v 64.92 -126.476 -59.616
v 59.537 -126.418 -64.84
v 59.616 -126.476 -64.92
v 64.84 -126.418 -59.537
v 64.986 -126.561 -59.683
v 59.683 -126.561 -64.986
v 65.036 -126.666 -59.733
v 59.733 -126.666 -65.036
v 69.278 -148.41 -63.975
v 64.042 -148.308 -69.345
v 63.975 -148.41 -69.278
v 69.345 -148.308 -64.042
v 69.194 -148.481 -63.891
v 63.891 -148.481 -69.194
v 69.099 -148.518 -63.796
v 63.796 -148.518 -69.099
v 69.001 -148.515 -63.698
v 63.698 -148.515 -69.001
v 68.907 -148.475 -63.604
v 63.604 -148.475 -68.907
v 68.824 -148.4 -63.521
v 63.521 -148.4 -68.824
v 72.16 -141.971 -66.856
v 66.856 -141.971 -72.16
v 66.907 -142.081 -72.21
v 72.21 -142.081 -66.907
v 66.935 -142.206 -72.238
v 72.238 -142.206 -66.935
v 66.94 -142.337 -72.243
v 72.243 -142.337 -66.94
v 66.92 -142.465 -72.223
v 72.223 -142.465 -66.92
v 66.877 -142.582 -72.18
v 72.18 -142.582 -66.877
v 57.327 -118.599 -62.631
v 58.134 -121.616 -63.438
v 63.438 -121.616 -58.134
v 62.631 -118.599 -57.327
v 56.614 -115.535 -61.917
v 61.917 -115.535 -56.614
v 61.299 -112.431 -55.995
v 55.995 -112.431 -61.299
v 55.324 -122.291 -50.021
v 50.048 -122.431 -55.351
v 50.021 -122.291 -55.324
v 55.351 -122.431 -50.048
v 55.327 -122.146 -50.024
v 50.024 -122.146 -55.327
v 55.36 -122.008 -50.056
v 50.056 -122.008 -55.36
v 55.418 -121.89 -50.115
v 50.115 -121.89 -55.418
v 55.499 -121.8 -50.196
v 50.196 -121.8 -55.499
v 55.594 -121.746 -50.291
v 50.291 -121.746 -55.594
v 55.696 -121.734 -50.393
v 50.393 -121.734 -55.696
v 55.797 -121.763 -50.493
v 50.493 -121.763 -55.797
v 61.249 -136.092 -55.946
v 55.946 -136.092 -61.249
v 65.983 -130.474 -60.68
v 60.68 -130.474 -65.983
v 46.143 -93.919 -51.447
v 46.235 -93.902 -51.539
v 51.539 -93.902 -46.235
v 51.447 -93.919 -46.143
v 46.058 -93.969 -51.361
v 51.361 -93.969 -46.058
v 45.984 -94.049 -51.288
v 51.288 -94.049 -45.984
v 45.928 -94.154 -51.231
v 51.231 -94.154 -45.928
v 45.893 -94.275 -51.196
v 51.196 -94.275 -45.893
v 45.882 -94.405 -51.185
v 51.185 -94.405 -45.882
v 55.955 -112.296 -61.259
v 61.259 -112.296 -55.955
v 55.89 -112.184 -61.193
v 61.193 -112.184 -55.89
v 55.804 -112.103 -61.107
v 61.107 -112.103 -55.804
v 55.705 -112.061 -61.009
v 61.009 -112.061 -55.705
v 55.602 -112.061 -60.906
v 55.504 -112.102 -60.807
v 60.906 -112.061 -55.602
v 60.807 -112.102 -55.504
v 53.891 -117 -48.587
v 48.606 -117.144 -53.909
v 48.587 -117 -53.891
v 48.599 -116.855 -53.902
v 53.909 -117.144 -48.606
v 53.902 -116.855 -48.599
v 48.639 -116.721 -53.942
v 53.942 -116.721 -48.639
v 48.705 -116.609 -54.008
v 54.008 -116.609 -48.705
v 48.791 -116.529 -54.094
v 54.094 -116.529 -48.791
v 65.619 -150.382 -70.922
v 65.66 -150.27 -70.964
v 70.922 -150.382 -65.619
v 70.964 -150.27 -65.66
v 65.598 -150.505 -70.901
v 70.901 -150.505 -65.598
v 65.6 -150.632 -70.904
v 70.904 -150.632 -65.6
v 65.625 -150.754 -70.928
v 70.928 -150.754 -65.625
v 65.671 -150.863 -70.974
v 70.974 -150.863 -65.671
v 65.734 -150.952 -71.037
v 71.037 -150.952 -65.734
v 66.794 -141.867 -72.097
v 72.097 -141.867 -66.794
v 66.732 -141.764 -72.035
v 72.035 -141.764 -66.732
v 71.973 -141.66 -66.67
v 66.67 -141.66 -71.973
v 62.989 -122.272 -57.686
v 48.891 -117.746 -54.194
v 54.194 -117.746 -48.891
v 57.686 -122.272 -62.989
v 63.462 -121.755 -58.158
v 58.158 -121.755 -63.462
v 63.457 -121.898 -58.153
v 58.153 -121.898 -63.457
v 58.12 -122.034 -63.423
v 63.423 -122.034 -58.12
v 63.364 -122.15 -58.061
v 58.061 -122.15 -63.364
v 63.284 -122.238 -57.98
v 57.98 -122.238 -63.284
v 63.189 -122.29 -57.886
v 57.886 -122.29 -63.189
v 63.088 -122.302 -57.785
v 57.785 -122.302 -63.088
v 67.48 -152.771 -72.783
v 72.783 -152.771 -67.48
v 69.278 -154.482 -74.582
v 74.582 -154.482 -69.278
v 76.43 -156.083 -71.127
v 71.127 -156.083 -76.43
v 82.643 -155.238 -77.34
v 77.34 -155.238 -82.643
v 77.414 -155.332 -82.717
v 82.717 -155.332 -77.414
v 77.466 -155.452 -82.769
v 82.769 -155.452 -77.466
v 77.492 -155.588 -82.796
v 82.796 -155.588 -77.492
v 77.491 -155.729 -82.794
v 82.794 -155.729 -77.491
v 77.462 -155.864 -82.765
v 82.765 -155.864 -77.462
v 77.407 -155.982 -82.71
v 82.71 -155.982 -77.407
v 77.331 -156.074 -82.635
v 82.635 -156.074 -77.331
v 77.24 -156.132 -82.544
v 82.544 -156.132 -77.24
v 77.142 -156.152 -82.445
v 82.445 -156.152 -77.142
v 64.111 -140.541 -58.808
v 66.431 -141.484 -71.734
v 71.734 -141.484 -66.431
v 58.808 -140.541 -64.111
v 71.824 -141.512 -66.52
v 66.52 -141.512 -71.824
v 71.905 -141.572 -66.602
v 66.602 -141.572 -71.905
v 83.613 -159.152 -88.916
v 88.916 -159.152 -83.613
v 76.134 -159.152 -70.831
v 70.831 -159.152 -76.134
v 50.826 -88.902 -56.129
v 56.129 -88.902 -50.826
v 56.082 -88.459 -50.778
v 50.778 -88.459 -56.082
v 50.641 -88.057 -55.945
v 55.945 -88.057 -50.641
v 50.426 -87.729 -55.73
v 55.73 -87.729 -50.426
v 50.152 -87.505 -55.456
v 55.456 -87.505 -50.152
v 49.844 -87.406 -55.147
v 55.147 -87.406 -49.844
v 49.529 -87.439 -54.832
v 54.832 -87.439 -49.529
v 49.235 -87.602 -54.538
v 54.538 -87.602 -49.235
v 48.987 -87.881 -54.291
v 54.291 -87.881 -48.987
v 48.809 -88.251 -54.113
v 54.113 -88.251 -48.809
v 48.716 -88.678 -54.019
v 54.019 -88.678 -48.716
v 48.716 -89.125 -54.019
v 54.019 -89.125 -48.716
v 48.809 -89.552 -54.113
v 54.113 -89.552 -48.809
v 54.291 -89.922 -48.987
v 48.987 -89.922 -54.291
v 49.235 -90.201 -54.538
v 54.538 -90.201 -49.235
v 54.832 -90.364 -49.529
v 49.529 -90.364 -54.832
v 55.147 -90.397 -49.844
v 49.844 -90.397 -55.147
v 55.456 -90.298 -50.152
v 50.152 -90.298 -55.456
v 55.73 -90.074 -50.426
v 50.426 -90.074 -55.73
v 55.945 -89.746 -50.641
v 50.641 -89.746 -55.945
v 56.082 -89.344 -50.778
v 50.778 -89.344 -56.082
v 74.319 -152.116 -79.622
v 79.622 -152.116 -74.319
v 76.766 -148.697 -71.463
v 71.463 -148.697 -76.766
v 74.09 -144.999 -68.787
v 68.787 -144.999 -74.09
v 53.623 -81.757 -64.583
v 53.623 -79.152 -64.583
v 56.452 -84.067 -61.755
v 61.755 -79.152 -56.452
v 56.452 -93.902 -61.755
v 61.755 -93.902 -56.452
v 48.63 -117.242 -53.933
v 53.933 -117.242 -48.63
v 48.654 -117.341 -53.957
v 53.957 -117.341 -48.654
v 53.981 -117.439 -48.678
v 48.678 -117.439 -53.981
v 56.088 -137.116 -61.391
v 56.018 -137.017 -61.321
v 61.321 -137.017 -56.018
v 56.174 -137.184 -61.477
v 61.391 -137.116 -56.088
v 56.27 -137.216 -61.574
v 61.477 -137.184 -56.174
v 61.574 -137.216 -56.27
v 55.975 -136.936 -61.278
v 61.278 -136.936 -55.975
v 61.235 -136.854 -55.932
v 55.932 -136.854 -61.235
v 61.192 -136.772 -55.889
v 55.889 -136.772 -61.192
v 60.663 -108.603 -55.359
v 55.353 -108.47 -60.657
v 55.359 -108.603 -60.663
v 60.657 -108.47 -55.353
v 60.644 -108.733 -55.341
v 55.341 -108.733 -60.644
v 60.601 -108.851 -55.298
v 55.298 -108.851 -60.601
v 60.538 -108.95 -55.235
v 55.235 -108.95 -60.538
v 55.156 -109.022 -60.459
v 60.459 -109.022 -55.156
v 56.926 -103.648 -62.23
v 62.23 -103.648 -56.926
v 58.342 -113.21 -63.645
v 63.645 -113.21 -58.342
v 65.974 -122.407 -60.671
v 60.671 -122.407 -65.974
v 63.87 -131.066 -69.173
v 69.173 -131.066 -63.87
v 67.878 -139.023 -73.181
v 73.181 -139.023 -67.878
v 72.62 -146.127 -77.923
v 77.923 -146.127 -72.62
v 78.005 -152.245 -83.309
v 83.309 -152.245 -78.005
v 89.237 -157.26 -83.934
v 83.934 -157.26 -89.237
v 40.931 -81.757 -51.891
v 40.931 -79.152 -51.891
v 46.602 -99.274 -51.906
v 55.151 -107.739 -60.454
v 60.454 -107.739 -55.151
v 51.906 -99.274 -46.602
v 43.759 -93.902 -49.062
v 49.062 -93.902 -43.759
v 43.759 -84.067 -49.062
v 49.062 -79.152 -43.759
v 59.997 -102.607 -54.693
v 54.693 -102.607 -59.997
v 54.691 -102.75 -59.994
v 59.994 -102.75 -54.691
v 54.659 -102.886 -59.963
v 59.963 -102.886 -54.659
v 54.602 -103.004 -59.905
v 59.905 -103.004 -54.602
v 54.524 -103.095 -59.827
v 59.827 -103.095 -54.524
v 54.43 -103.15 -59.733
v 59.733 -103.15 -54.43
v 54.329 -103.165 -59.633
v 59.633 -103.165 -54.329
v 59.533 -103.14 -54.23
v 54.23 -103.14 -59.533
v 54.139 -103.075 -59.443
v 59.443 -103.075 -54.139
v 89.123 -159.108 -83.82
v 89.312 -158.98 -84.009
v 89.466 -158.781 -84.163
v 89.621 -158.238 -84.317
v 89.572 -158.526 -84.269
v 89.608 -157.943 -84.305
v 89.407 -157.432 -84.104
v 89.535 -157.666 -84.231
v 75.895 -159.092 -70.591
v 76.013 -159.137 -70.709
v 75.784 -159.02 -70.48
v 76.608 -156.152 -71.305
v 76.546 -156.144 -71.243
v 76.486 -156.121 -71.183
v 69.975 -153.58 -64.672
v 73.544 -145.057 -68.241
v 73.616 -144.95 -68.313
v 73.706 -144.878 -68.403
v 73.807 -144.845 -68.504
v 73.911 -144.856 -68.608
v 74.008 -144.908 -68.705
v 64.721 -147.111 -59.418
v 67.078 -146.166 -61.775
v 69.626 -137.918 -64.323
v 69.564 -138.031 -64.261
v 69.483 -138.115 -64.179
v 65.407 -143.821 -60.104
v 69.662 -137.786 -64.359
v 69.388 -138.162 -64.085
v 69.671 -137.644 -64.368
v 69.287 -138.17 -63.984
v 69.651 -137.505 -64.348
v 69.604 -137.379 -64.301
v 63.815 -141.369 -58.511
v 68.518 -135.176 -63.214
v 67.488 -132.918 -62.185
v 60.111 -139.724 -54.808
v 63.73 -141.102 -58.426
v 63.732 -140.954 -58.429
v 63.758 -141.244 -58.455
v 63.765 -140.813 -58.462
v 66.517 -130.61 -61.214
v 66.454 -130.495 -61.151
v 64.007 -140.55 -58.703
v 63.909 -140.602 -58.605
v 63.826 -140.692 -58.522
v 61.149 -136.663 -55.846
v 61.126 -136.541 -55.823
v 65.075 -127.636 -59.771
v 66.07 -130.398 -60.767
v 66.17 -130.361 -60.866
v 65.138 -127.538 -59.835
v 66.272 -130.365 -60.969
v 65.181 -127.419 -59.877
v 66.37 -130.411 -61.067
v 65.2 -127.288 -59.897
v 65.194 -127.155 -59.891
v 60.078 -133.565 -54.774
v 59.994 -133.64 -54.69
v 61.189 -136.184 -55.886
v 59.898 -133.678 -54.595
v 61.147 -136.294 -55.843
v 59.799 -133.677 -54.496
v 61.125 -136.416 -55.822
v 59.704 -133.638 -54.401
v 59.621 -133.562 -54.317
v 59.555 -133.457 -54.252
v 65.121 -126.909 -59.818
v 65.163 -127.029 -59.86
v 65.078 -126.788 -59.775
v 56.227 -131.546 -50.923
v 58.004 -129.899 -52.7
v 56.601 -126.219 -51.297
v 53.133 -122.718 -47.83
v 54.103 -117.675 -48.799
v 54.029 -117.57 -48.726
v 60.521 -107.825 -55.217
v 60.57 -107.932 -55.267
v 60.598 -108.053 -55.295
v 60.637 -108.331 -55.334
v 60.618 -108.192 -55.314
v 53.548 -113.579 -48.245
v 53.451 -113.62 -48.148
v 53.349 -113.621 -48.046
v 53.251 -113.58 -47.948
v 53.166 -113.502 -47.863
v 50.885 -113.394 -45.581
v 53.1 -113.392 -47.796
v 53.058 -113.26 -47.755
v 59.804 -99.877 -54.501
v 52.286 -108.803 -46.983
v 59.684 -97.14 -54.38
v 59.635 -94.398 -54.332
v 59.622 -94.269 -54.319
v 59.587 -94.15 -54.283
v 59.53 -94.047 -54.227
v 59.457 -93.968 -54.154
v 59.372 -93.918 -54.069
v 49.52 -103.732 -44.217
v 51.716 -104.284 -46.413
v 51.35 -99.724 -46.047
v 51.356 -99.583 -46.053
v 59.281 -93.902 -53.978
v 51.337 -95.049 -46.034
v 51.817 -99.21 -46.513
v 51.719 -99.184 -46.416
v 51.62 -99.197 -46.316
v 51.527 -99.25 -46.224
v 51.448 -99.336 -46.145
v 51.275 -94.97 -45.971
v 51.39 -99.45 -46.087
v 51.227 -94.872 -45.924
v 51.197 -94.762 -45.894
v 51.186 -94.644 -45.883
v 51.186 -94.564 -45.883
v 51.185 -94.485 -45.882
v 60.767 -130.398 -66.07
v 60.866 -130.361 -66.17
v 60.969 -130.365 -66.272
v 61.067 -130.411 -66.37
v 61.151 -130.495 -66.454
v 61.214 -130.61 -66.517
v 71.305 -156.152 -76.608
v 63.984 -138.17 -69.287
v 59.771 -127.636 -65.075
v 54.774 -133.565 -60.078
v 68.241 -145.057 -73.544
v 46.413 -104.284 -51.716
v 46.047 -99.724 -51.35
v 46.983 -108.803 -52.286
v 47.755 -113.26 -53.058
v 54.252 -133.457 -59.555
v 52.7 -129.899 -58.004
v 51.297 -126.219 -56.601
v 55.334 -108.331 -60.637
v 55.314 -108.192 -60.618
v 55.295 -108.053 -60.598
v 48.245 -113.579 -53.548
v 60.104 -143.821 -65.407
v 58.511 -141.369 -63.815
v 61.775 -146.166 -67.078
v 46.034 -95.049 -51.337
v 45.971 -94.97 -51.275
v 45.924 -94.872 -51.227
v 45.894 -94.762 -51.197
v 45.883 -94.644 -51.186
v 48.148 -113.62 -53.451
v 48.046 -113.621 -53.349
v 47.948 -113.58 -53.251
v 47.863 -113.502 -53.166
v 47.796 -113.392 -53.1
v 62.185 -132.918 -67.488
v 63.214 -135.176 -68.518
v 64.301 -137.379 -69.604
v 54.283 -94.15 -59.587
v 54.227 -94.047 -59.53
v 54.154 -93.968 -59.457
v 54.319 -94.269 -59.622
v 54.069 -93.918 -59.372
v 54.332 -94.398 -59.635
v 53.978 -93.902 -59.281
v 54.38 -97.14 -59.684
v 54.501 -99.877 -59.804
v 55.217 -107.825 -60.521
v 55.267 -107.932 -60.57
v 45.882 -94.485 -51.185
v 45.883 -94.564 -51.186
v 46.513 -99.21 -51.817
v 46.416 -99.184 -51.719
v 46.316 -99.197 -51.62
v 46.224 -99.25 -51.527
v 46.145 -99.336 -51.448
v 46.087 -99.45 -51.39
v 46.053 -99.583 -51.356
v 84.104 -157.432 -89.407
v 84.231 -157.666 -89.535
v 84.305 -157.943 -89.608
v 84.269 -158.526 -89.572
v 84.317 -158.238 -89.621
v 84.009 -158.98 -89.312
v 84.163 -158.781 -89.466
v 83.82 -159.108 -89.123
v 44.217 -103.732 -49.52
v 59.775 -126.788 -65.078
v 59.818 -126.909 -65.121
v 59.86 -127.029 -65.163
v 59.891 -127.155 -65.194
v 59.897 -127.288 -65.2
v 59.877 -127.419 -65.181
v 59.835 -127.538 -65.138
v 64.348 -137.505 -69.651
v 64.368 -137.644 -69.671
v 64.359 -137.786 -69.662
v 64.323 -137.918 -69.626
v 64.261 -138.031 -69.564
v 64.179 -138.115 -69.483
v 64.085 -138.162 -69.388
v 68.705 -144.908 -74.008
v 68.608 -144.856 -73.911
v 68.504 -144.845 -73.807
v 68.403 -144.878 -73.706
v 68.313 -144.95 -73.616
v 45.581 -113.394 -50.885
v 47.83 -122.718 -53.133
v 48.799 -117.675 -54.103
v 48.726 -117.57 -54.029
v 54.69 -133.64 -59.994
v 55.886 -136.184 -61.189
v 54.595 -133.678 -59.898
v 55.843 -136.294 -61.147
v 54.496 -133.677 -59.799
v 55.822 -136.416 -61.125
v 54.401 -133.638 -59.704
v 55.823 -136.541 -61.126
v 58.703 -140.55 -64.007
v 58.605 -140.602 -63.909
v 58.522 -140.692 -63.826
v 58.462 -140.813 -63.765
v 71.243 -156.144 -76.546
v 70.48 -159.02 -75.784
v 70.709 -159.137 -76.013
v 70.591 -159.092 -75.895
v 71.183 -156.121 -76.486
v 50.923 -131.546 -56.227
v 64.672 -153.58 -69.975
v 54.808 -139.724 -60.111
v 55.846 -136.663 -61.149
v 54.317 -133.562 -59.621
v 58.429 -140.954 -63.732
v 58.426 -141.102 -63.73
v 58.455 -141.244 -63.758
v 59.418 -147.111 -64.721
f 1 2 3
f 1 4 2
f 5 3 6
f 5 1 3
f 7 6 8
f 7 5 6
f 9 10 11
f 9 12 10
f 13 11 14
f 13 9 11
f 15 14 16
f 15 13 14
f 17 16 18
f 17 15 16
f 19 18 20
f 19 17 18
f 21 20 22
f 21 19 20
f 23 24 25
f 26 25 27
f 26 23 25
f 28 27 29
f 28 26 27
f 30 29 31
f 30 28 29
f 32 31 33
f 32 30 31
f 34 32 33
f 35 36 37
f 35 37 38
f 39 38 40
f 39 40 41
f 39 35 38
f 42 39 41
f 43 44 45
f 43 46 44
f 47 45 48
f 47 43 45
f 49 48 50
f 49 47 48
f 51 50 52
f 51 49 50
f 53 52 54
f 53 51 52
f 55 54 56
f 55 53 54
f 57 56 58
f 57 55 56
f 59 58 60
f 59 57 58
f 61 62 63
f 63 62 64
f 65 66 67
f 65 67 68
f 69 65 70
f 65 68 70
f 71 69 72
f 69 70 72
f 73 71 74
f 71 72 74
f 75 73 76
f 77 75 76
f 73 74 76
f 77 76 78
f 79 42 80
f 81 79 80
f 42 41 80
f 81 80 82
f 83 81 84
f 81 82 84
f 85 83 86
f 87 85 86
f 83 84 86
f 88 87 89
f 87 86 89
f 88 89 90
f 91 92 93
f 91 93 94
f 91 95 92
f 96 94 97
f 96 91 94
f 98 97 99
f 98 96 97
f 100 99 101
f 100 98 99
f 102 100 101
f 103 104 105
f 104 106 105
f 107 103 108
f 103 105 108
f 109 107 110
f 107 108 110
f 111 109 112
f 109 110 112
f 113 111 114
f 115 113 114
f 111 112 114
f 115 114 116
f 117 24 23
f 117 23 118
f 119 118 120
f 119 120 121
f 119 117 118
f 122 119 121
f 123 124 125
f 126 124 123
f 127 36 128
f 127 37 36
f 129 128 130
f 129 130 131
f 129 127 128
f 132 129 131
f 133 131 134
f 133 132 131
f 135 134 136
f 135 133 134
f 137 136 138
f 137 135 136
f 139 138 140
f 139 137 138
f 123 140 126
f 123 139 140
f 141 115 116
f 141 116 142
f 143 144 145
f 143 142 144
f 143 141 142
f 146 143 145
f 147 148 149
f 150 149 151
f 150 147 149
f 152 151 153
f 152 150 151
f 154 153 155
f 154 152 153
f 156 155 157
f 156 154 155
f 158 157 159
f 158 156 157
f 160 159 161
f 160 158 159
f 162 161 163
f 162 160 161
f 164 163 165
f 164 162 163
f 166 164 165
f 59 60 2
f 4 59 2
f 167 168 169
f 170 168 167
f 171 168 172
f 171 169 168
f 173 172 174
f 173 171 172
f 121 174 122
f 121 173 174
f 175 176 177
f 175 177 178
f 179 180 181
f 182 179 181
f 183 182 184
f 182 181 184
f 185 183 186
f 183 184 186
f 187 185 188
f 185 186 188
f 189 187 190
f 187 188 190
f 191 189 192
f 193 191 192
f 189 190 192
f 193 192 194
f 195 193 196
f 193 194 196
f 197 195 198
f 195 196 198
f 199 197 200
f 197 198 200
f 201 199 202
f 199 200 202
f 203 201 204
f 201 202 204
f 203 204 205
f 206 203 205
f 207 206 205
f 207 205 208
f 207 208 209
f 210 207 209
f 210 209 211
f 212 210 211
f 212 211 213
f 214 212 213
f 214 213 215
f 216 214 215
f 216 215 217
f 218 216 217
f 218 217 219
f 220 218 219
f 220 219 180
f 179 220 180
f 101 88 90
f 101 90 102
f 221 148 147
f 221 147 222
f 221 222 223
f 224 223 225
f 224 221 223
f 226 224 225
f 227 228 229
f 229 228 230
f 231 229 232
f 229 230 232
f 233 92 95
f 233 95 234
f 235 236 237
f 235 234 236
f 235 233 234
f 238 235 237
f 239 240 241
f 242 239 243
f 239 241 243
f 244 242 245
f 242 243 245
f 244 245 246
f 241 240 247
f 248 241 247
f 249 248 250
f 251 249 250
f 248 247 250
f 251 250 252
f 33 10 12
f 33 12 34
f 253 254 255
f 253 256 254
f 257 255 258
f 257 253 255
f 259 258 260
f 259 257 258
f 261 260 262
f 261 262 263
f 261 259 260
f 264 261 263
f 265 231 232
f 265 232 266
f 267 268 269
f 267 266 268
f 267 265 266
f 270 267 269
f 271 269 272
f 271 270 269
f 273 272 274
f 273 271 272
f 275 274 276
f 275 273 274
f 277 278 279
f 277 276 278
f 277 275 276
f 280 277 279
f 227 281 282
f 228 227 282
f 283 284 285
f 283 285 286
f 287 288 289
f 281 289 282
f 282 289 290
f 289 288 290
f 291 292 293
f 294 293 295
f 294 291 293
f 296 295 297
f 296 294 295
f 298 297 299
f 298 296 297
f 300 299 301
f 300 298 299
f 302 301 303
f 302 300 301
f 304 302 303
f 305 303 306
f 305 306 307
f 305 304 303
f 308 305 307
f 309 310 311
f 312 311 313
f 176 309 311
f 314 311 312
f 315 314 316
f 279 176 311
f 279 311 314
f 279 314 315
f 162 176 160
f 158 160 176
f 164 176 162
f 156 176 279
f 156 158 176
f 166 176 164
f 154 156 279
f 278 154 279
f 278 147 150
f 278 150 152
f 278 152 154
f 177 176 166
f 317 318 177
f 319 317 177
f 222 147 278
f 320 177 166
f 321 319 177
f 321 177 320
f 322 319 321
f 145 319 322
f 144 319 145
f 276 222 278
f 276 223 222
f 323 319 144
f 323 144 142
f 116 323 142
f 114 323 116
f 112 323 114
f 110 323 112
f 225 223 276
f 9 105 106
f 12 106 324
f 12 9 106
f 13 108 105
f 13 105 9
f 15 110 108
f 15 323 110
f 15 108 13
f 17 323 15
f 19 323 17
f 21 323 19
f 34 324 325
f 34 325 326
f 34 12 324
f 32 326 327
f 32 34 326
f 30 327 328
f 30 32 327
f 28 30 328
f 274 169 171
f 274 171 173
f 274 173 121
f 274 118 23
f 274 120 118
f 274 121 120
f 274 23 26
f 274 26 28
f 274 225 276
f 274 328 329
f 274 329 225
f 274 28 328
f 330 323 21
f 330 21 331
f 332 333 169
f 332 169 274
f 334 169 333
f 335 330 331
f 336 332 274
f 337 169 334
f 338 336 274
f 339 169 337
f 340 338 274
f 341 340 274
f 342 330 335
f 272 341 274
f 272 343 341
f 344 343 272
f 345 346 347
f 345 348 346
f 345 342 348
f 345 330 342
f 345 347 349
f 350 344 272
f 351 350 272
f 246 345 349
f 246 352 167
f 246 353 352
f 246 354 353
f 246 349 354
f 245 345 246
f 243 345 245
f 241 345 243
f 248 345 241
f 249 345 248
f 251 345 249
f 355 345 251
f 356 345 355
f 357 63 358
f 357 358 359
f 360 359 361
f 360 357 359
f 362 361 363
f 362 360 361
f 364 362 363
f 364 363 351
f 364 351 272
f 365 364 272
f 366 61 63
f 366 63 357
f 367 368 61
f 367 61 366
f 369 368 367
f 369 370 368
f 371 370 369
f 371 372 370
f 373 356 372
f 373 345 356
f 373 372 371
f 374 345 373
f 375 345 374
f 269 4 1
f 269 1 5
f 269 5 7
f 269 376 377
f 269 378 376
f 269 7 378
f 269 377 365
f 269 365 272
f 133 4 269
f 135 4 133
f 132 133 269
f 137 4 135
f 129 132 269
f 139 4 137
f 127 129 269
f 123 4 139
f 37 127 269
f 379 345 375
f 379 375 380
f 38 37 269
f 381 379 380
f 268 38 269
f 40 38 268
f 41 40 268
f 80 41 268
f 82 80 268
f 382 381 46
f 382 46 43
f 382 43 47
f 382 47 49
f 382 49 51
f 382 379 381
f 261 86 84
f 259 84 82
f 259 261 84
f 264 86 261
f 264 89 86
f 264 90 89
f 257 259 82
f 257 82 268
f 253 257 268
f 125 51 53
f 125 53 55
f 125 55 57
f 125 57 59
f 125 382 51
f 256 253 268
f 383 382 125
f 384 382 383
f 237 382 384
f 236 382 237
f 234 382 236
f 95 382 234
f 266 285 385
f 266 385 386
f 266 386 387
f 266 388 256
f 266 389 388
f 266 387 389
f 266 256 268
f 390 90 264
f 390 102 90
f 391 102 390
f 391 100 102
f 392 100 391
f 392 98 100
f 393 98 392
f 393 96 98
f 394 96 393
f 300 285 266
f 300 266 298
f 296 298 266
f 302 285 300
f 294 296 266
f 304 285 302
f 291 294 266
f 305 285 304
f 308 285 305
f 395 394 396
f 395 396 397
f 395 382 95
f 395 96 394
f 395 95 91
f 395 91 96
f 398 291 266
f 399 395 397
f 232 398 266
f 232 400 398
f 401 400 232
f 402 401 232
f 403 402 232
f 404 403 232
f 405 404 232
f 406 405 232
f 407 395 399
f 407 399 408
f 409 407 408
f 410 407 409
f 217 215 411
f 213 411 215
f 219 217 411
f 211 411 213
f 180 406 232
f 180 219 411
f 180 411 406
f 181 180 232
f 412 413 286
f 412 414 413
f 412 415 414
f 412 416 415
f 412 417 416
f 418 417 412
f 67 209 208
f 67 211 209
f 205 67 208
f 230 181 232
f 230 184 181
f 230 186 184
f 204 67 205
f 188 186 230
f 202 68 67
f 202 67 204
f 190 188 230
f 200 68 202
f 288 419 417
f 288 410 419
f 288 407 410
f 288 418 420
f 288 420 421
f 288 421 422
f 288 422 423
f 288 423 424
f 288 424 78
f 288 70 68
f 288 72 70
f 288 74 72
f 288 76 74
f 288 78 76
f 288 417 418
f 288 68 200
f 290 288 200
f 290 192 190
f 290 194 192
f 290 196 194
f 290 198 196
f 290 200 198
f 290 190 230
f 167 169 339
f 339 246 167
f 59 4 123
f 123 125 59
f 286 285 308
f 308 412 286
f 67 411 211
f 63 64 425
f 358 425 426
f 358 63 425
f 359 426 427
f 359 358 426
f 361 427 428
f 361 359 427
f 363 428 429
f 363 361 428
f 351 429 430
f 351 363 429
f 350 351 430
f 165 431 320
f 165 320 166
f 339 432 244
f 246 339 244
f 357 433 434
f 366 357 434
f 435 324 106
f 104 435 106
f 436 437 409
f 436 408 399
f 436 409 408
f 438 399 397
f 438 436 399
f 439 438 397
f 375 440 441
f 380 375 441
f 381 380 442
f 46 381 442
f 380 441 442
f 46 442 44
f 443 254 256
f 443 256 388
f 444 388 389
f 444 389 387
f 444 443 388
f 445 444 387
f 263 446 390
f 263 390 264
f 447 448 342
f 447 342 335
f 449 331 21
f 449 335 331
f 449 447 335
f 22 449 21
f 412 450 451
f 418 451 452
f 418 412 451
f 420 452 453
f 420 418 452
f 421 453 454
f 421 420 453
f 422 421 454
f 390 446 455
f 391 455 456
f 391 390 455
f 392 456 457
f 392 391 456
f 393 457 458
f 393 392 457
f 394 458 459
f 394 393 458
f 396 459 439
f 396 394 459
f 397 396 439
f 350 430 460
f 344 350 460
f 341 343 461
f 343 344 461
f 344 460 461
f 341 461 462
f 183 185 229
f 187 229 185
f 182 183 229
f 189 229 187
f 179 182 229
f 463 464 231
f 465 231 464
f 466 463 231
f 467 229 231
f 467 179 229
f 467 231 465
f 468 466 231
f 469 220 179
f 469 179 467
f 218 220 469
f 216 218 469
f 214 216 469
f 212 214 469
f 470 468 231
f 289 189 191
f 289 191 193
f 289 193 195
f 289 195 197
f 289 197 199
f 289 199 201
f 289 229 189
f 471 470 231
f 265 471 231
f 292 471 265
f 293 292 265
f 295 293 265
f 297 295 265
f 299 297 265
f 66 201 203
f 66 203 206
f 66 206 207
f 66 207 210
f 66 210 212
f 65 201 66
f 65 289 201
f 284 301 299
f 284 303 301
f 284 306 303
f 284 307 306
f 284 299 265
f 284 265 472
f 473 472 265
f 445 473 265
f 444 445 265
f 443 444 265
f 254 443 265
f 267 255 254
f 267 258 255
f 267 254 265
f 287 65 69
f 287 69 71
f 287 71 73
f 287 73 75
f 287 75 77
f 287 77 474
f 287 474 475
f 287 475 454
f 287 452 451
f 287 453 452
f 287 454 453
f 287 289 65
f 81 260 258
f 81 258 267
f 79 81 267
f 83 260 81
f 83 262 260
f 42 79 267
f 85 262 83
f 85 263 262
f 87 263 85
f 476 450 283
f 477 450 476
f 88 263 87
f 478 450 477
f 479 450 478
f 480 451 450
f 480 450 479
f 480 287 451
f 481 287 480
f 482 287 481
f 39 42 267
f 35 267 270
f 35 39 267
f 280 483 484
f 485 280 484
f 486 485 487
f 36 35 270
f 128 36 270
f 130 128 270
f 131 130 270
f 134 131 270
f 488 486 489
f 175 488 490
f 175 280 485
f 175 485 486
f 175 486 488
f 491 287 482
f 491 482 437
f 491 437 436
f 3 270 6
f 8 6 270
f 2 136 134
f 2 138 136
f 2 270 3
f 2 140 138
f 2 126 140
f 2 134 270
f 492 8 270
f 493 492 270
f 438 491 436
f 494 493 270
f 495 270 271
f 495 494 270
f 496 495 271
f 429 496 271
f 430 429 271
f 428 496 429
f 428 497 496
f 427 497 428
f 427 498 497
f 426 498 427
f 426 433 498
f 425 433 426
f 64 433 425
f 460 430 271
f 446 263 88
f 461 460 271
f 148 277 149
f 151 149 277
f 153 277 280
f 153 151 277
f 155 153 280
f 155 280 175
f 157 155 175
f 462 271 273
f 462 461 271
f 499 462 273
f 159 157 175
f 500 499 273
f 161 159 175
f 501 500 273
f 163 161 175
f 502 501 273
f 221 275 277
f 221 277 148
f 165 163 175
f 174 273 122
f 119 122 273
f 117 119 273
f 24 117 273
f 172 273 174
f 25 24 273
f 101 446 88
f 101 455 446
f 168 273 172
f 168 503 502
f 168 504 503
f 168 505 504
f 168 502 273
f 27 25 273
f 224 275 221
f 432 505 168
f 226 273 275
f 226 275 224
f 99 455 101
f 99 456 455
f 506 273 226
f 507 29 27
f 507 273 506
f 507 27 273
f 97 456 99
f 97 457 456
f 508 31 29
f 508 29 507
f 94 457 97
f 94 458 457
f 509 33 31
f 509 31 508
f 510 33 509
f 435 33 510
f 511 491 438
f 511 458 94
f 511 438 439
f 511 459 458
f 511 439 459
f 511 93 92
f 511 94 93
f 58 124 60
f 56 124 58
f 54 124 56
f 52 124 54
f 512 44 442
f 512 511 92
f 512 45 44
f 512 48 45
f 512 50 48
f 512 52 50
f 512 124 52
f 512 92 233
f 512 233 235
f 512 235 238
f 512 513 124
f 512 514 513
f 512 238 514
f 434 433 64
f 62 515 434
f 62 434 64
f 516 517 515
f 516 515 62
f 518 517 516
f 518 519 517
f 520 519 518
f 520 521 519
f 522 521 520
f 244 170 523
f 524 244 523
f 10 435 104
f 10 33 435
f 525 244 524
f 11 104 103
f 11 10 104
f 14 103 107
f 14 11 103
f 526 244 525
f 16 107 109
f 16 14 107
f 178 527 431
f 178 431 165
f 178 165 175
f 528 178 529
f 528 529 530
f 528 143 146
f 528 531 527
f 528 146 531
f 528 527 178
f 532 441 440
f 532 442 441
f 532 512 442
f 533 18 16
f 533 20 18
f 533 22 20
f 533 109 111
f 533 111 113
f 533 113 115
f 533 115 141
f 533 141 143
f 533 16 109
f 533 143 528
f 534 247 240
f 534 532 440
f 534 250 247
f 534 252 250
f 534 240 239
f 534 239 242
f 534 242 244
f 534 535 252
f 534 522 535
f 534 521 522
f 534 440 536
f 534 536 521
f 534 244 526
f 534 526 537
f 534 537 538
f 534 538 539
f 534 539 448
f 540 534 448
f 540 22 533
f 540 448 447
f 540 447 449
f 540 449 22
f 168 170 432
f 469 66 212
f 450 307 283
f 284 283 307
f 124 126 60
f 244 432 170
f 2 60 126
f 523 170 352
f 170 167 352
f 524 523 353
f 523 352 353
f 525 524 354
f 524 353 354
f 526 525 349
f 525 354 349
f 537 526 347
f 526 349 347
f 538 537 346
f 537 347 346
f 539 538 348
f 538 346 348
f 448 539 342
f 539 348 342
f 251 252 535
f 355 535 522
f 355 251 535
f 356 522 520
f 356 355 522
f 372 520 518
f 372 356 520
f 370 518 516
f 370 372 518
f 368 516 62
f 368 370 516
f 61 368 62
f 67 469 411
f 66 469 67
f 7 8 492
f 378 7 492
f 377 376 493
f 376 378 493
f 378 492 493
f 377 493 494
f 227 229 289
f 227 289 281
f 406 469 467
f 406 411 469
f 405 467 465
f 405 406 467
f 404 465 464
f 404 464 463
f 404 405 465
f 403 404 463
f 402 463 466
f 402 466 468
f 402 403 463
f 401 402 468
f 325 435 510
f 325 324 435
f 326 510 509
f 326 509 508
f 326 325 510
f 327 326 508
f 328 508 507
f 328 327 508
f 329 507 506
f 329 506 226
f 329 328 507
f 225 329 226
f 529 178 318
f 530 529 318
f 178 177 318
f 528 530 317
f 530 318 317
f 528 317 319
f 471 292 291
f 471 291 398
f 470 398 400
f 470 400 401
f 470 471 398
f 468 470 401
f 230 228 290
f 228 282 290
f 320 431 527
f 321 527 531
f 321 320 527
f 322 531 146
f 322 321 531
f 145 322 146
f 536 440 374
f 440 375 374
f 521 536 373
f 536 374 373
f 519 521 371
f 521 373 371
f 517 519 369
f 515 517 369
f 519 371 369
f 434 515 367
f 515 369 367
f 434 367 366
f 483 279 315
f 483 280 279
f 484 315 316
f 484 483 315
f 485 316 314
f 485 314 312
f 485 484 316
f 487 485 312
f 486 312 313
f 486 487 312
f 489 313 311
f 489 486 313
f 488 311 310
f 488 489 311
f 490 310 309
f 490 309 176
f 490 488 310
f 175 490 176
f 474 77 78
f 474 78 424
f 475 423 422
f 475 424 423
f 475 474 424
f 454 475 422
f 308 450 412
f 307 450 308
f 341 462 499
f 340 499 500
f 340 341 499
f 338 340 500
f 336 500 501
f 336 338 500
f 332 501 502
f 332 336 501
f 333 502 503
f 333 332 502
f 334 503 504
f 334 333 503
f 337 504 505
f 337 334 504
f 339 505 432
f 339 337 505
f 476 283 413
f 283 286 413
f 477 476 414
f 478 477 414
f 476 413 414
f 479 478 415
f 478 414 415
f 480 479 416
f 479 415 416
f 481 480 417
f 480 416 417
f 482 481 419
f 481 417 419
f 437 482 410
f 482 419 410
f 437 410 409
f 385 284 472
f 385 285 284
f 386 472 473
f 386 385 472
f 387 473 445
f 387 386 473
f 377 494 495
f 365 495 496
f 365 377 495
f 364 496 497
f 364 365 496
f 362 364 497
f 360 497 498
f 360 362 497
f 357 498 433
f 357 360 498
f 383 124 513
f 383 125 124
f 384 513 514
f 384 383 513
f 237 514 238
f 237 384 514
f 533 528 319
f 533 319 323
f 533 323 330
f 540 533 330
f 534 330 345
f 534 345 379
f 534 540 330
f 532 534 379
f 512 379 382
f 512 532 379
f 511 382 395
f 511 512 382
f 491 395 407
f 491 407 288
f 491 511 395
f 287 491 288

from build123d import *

# Parameters (mm, degrees)
BOSS_EXTRUDE1_DEPTH      = 40
BOSS_EXTRUDE1_DEPTH_BACK = 40
CUT_EXTRUDE1_DEPTH       = 30
CUT_EXTRUDE1_DEPTH_BACK  = 48.5
SKETCH3_R                = 1.5
CUT_EXTRUDE2_DEPTH       = 40.921431767
FILLET1_R                = 1
CUT_EXTRUDE3_DEPTH       = 40
FILLET2_R                = 0.5


with BuildPart() as part:
    # Sketch1 → Boss-Extrude1 (new body, two sides)
    with BuildSketch(Plane(origin=(61.148873397, 0, -61.148873397), x_dir=(0.707106781, 0, 0.707106781), z_dir=(-0.707106781, 0, 0.707106781))) as boss_extrude1_sk:
        Polygon((-3.75, -92.901515315), (-3.75, -84.066578824), (-7.75, -81.757177748), (-7.75, -79.151515315), (3.75, -79.151515315), (3.75, -92.901515315), (3.75, -159.151515315), (-3.75, -159.151515315), align=None)
    extrude(amount=BOSS_EXTRUDE1_DEPTH)
    extrude(boss_extrude1_sk.sketch, amount=-BOSS_EXTRUDE1_DEPTH_BACK)

    # Sketch2 → Cut-Extrude1 (cut, two sides)
    with BuildSketch(Plane(origin=(-2.651650429, 0, -2.651650429), x_dir=(-0.707106781, 0, 0.707106781), z_dir=(-0.707106781, 0, -0.707106781))) as cut_extrude1_sk:
        with BuildLine():
            Line((-83.584702548, -79.151515315), (-83.584702548, -93.901515315))
            ThreePointArc((-83.584702548, -93.901515315), (-95.268174411, -132.944313121), (-126.477566081, -159.151515315))
            Line((-126.477566081, -159.151515315), (-126.477566081, -79.151515315))
            Line((-126.477566081, -79.151515315), (-83.584702548, -79.151515315))
        make_face()
        with BuildLine():
            Line((-65.634702548, -93.901515315), (-65.634702548, -79.151515315))
            Line((-65.634702548, -79.151515315), (-46.477566081, -79.151515315))
            Line((-46.477566081, -79.151515315), (-46.477566081, -159.151515315))
            Line((-46.477566081, -159.151515315), (-103.655823441, -159.151515315))
            ThreePointArc((-103.655823441, -159.151515315), (-75.833406523, -131.661176774), (-65.634702548, -93.901515315))
        make_face()
    extrude(amount=CUT_EXTRUDE1_DEPTH, mode=Mode.SUBTRACT)
    extrude(cut_extrude1_sk.sketch, amount=-CUT_EXTRUDE1_DEPTH_BACK, mode=Mode.SUBTRACT)

    # Sketch3 → Cut-Extrude2 (cut, through all)
    with BuildSketch(Plane(origin=(2.651650429, 0, 2.651650429), x_dir=(0.707106781, 0, -0.707106781), z_dir=(0.707106781, 0, 0.707106781))):
        with Locations((74.128214207, -88.901515315)):
            Circle(SKETCH3_R)
    extrude(amount=-CUT_EXTRUDE2_DEPTH, mode=Mode.SUBTRACT)

    # Fillet1
    fillet1_edges = [part.edges().sort_by_distance(p)[0] for p in [
        (73.295735665, -159.151515315, -73.295735665),
        (89.433144644, -159.151515315, -89.433144644),
    ]]
    fillet(fillet1_edges, radius=FILLET1_R)

    # Sketch4 → Cut-Extrude3 (cut)
    with BuildSketch(Plane(origin=(-2.651650429, 0, -2.651650429), x_dir=(-0.707106781, 0, 0.707106781), z_dir=(-0.707106781, 0, -0.707106781))):
        with BuildLine():
            ThreePointArc((-96.334442354, -150.659659636), (-100.301370683, -153.543969496), (-104.455461262, -156.151515315))
            Line((-104.455461262, -156.151515315), (-114.508069897, -156.151515315))
            ThreePointArc((-114.508069897, -156.151515315), (-107.203125114, -150.779152155), (-100.609312238, -144.554512732))
            Line((-100.609312238, -144.554512732), (-96.334442354, -150.659659636))
        make_face()
        with BuildLine():
            ThreePointArc((-85.691714117, -140.433955852), (-89.676742116, -144.76688928), (-94.002421329, -148.759790428))
            Line((-94.002421329, -148.759790428), (-98.550711636, -142.264158692))
            ThreePointArc((-98.550711636, -142.264158692), (-98.225553246, -141.884323374), (-97.902966063, -141.502301965))
            Line((-97.902966063, -141.502301965), (-85.691714117, -140.433955852))
        make_face()
        with BuildLine():
            ThreePointArc((-83.105887337, -137.19626581), (-82.806616537, -136.795716185), (-82.510134547, -136.393097949))
            Line((-82.510134547, -136.393097949), (-90.024605255, -130.087708349))
            ThreePointArc((-90.024605255, -130.087708349), (-92.547245897, -134.264707863), (-95.339415884, -138.266560873))
            Line((-95.339415884, -138.266560873), (-83.105887337, -137.19626581))
        make_face()
        with BuildLine():
            ThreePointArc((-80.784042437, -133.925239334), (-77.121371127, -127.814001685), (-74.080630429, -121.370688662))
            Line((-74.080630429, -121.370688662), (-88.136449193, -126.48658831))
            ThreePointArc((-88.136449193, -126.48658831), (-88.357906284, -126.934873492), (-88.582384151, -127.381653678))
            Line((-88.582384151, -127.381653678), (-80.784042437, -133.925239334))
        make_face()
        with BuildLine():
            Line((-82.791324081, -111.847238704), (-72.34560503, -116.718157493))
            ThreePointArc((-72.34560503, -116.718157493), (-72.505700586, -117.19183716), (-72.669081723, -117.664393631))
            Line((-72.669081723, -117.664393631), (-86.395070265, -122.660244896))
            ThreePointArc((-86.395070265, -122.660244896), (-84.384922058, -117.323155489), (-82.791324081, -111.847238704))
        make_face()
        with BuildLine():
            ThreePointArc((-68.79275862, -98.669648347), (-69.713665767, -106.319507983), (-71.446777789, -113.827153762))
            Line((-71.446777789, -113.827153762), (-82.109684478, -108.854958715))
            ThreePointArc((-82.109684478, -108.854958715), (-82.008492364, -108.355301003), (-81.910741312, -107.854958715))
            Line((-81.910741312, -107.854958715), (-68.79275862, -98.669648347))
        make_face()
        with BuildLine():
            ThreePointArc((-68.634702548, -93.901515315), (-68.636438764, -94.401527372), (-68.641647327, -94.901515315))
            Line((-68.641647327, -94.901515315), (-81.238542868, -103.721956531))
            ThreePointArc((-81.238542868, -103.721956531), (-80.748343571, -98.82260697), (-80.584702548, -93.901515315))
            Line((-80.584702548, -93.901515315), (-68.634702548, -93.901515315))
        make_face()
    extrude(amount=-CUT_EXTRUDE3_DEPTH, mode=Mode.SUBTRACT)

    # Fillet2
    fillet2_edges = [part.edges().sort_by_distance(p)[0] for p in [
        (68.11873745, -150.659659636, -68.11873745),
        (73.86116499, -156.151515315, -73.86116499),
        (80.969432725, -156.151515315, -80.969432725),
        (71.141526934, -144.554512732, -71.141526934),
        (60.593192144, -140.433955852, -60.593192144),
        (66.46974957, -148.759790428, -66.46974957),
        (69.685876488, -142.264158692, -69.685876488),
        (69.227851202, -141.502301965, -69.227851202),
        (58.343475655, -136.393097949, -58.343475655),
        (58.764736493, -137.19626581, -58.764736493),
        (67.415147486, -138.266560873, -67.415147486),
        (63.65700885, -130.087708349, -63.65700885),
        (52.382916131, -121.370688662, -52.382916131),
        (57.122944219, -133.925239334, -57.122944219),
        (62.637204527, -127.381653678, -62.637204527),
        (62.321880894, -126.48658831, -62.321880894),
        (58.542306681, -111.847238704, -58.542306681),
        (51.156067906, -116.718157493, -51.156067906),
        (51.384800469, -117.664393631, -51.384800469),
        (61.090540045, -122.660244896, -61.090540045),
        (48.643826116, -98.669648347, -48.643826116),
        (50.520501068, -113.827153762, -50.520501068),
        (58.060314695, -108.854958715, -58.060314695),
        (57.919640634, -107.854958715, -57.919640634),
        (48.532063596, -93.901515315, -48.532063596),
        (48.536974297, -94.901515315, -48.536974297),
        (57.444324556, -103.721956531, -57.444324556),
        (56.981989631, -93.901515315, -56.981989631),
    ]]
    fillet(fillet2_edges, radius=FILLET2_R)


solid = part.part
